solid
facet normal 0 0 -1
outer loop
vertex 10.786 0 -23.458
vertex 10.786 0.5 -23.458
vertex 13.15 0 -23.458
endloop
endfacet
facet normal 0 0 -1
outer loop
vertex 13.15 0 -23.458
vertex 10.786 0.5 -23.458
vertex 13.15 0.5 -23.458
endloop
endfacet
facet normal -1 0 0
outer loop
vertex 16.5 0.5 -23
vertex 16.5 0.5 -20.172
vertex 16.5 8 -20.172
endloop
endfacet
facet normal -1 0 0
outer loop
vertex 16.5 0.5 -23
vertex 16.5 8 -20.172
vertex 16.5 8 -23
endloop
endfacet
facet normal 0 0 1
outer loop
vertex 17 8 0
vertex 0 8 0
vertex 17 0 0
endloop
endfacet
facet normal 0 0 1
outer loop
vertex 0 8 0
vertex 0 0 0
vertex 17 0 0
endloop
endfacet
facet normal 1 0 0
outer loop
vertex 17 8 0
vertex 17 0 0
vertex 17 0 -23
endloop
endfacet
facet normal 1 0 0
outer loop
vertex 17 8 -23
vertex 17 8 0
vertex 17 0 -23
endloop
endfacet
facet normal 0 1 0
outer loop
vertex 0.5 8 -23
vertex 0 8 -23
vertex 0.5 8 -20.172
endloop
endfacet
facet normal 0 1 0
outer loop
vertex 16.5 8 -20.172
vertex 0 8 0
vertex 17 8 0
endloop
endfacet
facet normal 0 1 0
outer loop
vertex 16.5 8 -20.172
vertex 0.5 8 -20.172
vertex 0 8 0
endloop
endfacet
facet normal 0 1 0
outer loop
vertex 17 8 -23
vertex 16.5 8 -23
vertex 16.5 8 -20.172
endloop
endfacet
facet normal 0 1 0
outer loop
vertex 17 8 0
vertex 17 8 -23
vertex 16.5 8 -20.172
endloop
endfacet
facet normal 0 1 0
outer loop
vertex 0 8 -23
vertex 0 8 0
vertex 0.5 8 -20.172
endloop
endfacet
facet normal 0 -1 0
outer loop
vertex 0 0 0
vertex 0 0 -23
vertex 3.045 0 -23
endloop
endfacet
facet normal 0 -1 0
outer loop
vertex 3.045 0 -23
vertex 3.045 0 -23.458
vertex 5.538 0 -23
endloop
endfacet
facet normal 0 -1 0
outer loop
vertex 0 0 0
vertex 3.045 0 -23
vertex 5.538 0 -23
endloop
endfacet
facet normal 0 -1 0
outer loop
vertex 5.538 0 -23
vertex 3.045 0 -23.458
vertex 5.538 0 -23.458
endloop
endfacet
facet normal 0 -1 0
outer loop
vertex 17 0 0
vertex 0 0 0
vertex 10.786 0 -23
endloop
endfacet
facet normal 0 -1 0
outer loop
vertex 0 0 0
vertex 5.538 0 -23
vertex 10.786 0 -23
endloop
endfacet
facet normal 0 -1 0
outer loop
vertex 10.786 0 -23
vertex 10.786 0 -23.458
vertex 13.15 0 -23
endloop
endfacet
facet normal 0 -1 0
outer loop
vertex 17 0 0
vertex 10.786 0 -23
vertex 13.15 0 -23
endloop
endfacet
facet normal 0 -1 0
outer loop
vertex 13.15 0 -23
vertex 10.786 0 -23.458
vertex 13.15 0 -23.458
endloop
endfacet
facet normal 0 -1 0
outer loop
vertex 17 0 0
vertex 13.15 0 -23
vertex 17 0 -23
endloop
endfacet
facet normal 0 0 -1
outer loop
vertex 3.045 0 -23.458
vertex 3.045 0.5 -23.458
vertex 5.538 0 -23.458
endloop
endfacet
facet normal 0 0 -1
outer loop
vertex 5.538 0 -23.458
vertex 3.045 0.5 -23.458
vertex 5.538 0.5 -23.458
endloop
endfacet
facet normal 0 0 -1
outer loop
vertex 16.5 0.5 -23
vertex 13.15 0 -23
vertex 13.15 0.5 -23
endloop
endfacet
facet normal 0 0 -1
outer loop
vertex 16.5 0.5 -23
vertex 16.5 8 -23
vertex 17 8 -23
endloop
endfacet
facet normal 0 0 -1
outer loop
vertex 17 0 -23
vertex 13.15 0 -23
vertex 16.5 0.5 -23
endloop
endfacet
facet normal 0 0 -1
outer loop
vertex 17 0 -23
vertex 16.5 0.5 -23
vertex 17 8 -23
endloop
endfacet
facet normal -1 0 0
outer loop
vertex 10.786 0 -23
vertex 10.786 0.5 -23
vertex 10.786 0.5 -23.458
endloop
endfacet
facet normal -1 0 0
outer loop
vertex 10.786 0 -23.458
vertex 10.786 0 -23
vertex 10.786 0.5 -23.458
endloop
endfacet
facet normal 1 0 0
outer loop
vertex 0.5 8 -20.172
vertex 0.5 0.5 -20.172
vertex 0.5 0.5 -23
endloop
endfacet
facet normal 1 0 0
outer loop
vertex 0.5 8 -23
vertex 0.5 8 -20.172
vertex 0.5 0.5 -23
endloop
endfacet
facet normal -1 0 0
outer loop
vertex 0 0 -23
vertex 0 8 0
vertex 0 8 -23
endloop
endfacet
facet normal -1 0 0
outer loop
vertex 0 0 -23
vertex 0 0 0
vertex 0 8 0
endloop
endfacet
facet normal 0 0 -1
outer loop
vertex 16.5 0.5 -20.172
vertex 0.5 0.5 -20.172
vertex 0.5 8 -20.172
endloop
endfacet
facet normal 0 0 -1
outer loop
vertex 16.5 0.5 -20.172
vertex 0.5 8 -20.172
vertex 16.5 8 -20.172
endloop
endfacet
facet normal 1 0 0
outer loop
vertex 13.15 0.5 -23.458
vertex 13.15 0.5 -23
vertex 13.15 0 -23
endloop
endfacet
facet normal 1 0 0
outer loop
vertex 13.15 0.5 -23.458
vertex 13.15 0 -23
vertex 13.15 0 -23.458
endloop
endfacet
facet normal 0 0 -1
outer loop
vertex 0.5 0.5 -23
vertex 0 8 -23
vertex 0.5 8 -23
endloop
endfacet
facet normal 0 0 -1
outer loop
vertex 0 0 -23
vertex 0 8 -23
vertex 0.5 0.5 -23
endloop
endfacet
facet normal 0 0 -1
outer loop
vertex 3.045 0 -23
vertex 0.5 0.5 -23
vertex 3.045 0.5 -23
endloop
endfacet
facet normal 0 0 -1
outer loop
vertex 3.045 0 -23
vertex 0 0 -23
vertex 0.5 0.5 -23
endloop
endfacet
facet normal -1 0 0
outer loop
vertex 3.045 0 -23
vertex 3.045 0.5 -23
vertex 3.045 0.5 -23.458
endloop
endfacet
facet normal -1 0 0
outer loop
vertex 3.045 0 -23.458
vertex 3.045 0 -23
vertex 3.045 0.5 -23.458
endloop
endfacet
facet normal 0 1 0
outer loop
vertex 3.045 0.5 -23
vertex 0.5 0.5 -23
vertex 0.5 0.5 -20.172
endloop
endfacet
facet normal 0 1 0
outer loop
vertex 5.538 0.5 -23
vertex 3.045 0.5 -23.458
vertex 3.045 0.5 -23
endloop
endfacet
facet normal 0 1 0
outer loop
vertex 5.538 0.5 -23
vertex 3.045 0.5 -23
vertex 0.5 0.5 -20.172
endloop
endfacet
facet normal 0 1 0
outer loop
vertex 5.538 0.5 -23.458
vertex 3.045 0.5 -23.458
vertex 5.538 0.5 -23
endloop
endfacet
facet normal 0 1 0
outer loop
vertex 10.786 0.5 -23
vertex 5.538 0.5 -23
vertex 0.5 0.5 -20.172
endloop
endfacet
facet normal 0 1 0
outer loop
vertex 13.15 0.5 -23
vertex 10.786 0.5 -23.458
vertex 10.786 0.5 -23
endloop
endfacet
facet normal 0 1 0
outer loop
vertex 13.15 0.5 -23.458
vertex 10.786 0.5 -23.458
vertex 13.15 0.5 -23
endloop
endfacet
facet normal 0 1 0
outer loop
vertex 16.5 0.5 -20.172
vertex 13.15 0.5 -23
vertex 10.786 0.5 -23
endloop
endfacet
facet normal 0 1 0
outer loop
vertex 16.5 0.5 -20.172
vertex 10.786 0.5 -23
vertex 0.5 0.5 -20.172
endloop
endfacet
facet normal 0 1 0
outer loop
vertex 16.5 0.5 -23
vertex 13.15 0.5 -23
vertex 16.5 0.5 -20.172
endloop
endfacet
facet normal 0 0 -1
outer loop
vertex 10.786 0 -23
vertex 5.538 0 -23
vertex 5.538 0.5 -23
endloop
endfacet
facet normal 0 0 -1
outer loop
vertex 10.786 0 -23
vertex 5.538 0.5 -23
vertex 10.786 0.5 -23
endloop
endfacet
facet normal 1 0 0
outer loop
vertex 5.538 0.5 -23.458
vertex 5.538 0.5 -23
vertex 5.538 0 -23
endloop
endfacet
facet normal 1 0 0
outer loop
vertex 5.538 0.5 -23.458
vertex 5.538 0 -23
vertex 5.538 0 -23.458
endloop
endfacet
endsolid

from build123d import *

# Parameters (mm, degrees)
SKETCH_1_W      = 17
SKETCH_1_H      = 23
EXTRUDE_1_DEPTH = 0.5
SKETCH_2_W      = 0.5
SKETCH_2_H      = 23
EXTRUDE_2_DEPTH = 7.5
SKETCH_3_W      = 16
SKETCH_3_H      = 20.172343548
EXTRUDE_3_DEPTH = 7.5
SKETCH_4_W      = 2.493920062
SKETCH_4_H      = 0.457616149
SKETCH_4_W_2    = 2.364028392
EXTRUDE_4_DEPTH = 0.5


with BuildPart() as part:
    # 草图1 → 凸台-拉伸1 (new body)
    with BuildSketch(Plane(origin=(0, 0, 0), x_dir=(1, 0, 0), z_dir=(0, 1, 0))):
        with Locations((8.5, 11.5)):
            Rectangle(SKETCH_1_W, SKETCH_1_H)
    extrude(amount=EXTRUDE_1_DEPTH)

    # 草图2 → 凸台-拉伸2 (add)
    with BuildSketch(Plane(origin=(0, 0.5, 0), x_dir=(1, 0, 0), z_dir=(0, 1, 0))):
        with Locations((0.25, 11.5)):
            Rectangle(SKETCH_2_W, SKETCH_2_H)
        with Locations((16.75, 11.5)):
            Rectangle(SKETCH_2_W, SKETCH_2_H)
    extrude(amount=EXTRUDE_2_DEPTH)

    # 草图3 → 凸台-拉伸3 (add)
    with BuildSketch(Plane(origin=(0, 0.5, 0), x_dir=(1, 0, 0), z_dir=(0, 1, 0))):
        with Locations((8.5, 10.086171774)):
            Rectangle(SKETCH_3_W, SKETCH_3_H)
    extrude(amount=EXTRUDE_3_DEPTH)

    # 草图4 → 凸台-拉伸4 (add)
    with BuildSketch(Plane(origin=(0, 0.5, 0), x_dir=(1, 0, 0), z_dir=(0, 1, 0))):
        with Locations((4.291509895, 23.228808075)):
            Rectangle(SKETCH_4_W, SKETCH_4_H)
        with Locations((11.968107586, 23.228808075)):
            Rectangle(SKETCH_4_W_2, SKETCH_4_H)
    extrude(amount=-EXTRUDE_4_DEPTH)


solid = part.part
